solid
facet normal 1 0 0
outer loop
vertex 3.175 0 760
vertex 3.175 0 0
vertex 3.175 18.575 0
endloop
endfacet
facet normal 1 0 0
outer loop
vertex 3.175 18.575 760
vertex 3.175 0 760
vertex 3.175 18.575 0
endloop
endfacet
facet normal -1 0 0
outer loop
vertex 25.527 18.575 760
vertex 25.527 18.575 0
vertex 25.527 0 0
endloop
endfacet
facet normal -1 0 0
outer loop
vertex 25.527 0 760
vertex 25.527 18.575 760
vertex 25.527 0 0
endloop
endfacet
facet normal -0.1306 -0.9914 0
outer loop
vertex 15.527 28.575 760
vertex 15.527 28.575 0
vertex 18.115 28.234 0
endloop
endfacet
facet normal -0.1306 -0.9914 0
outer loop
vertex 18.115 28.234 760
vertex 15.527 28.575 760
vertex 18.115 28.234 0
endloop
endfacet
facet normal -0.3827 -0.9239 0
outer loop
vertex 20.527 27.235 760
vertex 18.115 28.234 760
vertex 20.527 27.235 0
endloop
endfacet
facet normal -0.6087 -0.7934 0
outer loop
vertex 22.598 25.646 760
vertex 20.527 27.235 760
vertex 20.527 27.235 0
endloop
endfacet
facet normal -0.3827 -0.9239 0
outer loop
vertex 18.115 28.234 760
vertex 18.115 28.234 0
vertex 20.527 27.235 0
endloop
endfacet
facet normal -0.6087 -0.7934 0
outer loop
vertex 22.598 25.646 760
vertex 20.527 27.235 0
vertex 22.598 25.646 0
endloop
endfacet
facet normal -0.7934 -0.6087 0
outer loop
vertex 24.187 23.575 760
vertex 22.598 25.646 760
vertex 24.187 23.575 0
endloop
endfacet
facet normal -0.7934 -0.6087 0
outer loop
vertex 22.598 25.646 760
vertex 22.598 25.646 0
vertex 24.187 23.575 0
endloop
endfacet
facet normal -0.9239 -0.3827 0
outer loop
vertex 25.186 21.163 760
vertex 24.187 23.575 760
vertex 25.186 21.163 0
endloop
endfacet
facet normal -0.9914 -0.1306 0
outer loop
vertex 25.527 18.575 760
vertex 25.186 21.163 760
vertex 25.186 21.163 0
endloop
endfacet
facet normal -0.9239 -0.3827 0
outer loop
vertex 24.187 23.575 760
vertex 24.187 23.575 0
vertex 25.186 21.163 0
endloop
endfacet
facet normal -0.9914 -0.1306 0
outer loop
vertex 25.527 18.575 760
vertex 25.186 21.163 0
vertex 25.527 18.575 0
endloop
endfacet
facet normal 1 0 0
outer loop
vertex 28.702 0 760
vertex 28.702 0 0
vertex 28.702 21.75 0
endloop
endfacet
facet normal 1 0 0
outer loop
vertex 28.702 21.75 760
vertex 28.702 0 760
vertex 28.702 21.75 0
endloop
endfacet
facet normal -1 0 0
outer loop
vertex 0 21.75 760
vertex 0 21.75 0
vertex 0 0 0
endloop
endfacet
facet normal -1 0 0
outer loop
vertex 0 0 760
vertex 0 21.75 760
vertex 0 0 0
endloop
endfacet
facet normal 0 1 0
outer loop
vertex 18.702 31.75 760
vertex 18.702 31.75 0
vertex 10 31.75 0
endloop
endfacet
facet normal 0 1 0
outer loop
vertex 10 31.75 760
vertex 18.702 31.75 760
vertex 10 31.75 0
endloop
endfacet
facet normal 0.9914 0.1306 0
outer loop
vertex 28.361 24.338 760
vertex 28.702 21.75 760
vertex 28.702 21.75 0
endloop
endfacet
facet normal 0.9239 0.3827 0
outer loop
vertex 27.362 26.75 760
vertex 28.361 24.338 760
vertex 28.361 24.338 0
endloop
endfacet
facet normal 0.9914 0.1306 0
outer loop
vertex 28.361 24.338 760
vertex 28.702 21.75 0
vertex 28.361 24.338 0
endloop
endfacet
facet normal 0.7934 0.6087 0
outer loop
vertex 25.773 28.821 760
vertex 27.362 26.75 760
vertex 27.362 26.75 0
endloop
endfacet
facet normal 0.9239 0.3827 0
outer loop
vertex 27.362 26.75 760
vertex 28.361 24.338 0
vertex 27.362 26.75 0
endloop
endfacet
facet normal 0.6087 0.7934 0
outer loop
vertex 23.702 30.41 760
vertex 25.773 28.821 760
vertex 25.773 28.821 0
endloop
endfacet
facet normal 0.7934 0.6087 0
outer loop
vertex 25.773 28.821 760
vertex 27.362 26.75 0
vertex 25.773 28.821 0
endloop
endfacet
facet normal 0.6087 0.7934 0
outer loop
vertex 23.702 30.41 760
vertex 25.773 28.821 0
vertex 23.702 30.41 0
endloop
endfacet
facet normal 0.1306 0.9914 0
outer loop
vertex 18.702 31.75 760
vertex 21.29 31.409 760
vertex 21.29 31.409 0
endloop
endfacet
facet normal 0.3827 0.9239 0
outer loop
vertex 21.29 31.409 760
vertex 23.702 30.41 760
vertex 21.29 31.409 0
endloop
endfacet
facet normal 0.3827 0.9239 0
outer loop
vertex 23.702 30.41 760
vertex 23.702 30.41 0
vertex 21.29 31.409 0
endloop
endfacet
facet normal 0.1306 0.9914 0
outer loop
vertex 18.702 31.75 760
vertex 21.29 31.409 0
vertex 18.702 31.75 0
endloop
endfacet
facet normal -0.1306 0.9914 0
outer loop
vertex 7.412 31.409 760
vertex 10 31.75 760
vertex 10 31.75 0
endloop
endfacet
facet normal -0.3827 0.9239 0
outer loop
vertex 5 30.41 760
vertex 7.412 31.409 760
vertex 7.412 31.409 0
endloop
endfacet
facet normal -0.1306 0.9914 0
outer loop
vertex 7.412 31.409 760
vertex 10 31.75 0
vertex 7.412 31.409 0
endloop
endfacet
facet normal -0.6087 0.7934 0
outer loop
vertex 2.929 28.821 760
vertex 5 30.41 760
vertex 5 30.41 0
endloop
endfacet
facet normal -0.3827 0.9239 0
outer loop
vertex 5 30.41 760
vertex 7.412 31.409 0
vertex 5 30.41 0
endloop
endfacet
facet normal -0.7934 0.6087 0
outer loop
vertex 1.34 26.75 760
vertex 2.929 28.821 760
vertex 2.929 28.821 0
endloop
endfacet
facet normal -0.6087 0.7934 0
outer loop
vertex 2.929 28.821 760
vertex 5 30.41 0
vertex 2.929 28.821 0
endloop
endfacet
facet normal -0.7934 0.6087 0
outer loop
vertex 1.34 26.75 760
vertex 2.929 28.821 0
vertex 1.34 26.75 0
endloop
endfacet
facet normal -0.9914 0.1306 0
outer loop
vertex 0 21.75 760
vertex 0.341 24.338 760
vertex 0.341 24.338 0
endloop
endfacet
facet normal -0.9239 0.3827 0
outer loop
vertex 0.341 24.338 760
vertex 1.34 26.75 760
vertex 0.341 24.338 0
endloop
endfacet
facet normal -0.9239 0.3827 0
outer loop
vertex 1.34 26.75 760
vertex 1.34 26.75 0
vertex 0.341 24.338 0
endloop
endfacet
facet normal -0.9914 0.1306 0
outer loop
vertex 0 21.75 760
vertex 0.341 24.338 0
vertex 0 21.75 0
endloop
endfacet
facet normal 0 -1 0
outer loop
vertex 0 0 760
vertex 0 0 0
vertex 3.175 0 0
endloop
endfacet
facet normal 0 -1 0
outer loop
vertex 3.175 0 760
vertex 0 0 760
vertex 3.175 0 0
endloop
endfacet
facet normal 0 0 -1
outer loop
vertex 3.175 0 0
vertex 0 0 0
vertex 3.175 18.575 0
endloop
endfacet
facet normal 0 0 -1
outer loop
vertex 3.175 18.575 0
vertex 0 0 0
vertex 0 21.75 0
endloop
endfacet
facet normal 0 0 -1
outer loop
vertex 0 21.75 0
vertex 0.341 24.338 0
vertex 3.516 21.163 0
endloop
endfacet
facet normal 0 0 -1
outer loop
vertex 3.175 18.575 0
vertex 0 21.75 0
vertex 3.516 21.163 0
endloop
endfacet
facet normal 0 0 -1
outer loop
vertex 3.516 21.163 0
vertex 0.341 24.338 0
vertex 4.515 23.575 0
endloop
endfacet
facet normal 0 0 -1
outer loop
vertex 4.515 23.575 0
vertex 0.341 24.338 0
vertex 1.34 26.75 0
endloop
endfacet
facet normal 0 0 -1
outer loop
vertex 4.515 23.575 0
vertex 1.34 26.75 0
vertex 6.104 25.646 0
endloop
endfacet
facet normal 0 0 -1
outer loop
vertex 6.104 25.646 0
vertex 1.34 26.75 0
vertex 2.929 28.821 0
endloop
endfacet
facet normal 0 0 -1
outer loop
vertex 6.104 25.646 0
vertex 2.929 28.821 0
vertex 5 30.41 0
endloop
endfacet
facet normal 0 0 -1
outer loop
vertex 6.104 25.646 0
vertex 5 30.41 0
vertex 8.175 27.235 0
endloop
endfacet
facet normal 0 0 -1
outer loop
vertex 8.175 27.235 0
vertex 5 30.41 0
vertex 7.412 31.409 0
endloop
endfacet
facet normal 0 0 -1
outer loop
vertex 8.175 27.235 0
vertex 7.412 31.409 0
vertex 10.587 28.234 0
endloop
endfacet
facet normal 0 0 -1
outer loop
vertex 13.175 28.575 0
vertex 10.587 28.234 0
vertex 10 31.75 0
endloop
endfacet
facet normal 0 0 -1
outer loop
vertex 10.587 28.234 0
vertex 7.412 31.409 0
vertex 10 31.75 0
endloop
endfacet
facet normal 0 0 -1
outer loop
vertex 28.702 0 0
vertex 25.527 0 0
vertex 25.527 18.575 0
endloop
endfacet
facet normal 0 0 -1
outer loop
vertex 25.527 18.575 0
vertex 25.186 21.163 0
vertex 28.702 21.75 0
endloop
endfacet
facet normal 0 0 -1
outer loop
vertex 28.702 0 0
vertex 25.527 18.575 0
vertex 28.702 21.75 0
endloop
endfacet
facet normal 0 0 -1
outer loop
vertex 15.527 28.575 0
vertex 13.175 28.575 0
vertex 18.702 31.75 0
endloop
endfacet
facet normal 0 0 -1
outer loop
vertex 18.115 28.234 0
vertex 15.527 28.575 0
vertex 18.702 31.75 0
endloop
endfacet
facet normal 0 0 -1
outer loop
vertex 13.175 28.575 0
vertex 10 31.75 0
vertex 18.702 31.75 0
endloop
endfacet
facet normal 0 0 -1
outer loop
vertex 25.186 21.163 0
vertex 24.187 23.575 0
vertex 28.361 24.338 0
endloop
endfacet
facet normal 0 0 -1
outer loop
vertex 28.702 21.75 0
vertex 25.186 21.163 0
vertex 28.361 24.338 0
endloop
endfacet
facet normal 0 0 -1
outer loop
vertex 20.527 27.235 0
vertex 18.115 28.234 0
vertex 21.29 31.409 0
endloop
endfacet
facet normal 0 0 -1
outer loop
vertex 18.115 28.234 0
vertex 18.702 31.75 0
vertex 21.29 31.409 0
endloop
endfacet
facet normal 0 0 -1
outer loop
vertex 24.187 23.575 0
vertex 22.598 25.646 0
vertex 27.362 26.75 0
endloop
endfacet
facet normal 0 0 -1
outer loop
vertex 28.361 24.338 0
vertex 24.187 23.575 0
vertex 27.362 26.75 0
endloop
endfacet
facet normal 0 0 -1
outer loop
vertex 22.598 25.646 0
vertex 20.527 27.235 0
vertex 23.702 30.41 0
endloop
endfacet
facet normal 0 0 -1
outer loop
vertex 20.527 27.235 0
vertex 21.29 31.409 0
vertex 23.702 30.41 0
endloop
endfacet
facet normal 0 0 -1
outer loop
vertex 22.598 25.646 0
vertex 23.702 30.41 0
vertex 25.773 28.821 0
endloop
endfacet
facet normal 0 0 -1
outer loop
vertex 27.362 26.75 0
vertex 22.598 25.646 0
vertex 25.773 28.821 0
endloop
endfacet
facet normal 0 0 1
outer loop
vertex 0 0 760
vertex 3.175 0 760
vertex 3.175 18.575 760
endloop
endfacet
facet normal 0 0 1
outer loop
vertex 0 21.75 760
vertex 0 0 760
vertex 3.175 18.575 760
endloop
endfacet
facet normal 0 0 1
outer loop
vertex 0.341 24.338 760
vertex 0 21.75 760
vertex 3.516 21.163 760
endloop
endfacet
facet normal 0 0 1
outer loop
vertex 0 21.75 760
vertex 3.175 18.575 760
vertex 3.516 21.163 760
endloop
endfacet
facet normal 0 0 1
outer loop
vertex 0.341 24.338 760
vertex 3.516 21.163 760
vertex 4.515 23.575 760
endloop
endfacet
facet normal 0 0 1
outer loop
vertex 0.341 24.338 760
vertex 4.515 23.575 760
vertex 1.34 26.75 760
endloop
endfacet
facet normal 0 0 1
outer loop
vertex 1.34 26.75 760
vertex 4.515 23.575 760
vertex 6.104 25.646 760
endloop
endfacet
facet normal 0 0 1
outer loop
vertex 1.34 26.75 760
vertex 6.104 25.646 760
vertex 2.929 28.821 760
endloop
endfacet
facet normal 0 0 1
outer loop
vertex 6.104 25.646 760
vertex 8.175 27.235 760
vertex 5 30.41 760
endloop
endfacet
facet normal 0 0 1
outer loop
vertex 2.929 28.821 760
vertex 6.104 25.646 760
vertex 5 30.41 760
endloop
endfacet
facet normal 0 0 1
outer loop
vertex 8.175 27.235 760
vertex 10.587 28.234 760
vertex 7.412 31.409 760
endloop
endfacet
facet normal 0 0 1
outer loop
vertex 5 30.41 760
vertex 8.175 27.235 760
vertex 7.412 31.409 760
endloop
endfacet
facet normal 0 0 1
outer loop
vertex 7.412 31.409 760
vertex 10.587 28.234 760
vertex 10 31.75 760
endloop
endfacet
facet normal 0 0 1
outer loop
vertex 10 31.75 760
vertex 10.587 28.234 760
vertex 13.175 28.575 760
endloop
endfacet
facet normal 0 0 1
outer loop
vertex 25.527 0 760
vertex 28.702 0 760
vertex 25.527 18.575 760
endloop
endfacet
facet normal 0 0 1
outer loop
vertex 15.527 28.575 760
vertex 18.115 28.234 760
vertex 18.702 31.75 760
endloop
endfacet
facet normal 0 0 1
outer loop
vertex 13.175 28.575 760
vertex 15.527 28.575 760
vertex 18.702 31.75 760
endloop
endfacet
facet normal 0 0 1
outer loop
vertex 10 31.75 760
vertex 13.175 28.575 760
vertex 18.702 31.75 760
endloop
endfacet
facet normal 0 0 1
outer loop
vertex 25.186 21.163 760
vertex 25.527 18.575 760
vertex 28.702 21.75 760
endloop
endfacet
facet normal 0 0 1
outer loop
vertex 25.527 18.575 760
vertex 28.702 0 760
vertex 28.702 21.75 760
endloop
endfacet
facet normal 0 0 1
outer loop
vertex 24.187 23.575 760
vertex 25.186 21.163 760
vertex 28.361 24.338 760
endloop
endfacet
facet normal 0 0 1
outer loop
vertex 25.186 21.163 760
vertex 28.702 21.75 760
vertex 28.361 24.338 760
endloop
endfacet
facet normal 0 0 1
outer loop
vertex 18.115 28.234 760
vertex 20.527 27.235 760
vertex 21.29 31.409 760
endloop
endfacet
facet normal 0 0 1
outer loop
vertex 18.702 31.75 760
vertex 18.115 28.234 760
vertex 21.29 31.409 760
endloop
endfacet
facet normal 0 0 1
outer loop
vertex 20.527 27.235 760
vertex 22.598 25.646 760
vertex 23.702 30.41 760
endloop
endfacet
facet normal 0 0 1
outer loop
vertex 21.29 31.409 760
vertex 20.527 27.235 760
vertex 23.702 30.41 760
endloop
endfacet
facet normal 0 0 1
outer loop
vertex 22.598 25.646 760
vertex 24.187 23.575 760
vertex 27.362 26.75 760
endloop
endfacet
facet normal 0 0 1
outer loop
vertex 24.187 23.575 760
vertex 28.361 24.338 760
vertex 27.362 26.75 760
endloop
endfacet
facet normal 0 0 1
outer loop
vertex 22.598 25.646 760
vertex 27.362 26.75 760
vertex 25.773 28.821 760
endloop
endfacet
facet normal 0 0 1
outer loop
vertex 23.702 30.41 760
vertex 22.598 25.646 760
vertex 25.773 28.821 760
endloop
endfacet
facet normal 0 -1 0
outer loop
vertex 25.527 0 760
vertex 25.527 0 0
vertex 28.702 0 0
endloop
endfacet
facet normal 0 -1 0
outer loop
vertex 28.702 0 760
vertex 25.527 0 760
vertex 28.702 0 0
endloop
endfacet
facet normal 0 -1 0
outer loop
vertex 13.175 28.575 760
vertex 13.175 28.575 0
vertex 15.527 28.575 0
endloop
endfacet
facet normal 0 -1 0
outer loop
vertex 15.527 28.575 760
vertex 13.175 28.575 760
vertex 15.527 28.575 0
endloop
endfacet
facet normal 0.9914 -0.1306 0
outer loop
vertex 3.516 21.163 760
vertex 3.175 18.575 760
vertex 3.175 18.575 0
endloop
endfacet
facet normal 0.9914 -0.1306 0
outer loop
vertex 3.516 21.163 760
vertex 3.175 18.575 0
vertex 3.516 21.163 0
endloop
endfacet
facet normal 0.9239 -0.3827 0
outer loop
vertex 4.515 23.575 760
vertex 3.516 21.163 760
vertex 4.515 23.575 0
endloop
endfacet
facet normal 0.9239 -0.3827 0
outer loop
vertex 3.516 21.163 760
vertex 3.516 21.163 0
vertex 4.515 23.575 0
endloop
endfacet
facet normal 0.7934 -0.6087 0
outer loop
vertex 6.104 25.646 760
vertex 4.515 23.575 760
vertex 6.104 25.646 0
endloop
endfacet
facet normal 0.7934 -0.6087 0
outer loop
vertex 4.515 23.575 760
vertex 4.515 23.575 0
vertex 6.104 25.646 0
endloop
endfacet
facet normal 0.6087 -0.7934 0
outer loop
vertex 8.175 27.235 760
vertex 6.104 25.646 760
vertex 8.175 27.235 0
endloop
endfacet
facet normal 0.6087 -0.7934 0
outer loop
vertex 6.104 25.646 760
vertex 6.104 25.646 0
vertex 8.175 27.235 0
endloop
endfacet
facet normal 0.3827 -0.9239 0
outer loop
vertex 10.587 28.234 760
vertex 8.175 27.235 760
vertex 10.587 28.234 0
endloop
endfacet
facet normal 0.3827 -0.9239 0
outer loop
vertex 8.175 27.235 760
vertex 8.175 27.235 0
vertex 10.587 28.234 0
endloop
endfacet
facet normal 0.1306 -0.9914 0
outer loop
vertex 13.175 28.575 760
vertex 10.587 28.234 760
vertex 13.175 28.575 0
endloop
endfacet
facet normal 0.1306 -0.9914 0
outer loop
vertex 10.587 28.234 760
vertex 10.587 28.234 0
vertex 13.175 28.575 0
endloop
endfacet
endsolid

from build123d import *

# Parameters (mm, degrees)
BOSS_EXTRUDE1_DEPTH = 825
SKETCH3_W           = 95.704535521
SKETCH3_H           = 58.136059774
CUT_EXTRUDE2_DEPTH  = 825


with BuildPart() as part:
    # Sketch1 → Boss-Extrude1 (new body)
    with BuildSketch(Plane.XY):
        with BuildLine():
            Line((3.175, 0), (3.175, 18.575))
            ThreePointArc((3.175, 18.575), (6.103932188, 25.646067812), (13.175, 28.575))
            Line((13.175, 28.575), (15.527, 28.575))
            ThreePointArc((15.527, 28.575), (22.598067812, 25.646067812), (25.527, 18.575))
            Line((25.527, 18.575), (25.527, 0))
            Line((25.527, 0), (28.702, 0))
            Line((28.702, 0), (28.702, 21.75))
            ThreePointArc((28.702, 21.75), (25.773067812, 28.821067812), (18.702, 31.75))
            Line((18.702, 31.75), (10, 31.75))
            ThreePointArc((10, 31.75), (2.928932188, 28.821067812), (0, 21.75))
            Line((0, 21.75), (0, 0))
            Line((0, 0), (3.175, 0))
        make_face()
    extrude(amount=BOSS_EXTRUDE1_DEPTH)

    # Sketch3 → Cut-Extrude2 (cut)
    with BuildSketch(Plane(origin=(28.702, 0, 0), x_dir=(0, 0, -1), z_dir=(1, 0, 0))):
        with Locations((-807.852267761, 29.068029887)):
            Rectangle(SKETCH3_W, SKETCH3_H)
    extrude(amount=-CUT_EXTRUDE2_DEPTH, mode=Mode.SUBTRACT)


solid = part.part
